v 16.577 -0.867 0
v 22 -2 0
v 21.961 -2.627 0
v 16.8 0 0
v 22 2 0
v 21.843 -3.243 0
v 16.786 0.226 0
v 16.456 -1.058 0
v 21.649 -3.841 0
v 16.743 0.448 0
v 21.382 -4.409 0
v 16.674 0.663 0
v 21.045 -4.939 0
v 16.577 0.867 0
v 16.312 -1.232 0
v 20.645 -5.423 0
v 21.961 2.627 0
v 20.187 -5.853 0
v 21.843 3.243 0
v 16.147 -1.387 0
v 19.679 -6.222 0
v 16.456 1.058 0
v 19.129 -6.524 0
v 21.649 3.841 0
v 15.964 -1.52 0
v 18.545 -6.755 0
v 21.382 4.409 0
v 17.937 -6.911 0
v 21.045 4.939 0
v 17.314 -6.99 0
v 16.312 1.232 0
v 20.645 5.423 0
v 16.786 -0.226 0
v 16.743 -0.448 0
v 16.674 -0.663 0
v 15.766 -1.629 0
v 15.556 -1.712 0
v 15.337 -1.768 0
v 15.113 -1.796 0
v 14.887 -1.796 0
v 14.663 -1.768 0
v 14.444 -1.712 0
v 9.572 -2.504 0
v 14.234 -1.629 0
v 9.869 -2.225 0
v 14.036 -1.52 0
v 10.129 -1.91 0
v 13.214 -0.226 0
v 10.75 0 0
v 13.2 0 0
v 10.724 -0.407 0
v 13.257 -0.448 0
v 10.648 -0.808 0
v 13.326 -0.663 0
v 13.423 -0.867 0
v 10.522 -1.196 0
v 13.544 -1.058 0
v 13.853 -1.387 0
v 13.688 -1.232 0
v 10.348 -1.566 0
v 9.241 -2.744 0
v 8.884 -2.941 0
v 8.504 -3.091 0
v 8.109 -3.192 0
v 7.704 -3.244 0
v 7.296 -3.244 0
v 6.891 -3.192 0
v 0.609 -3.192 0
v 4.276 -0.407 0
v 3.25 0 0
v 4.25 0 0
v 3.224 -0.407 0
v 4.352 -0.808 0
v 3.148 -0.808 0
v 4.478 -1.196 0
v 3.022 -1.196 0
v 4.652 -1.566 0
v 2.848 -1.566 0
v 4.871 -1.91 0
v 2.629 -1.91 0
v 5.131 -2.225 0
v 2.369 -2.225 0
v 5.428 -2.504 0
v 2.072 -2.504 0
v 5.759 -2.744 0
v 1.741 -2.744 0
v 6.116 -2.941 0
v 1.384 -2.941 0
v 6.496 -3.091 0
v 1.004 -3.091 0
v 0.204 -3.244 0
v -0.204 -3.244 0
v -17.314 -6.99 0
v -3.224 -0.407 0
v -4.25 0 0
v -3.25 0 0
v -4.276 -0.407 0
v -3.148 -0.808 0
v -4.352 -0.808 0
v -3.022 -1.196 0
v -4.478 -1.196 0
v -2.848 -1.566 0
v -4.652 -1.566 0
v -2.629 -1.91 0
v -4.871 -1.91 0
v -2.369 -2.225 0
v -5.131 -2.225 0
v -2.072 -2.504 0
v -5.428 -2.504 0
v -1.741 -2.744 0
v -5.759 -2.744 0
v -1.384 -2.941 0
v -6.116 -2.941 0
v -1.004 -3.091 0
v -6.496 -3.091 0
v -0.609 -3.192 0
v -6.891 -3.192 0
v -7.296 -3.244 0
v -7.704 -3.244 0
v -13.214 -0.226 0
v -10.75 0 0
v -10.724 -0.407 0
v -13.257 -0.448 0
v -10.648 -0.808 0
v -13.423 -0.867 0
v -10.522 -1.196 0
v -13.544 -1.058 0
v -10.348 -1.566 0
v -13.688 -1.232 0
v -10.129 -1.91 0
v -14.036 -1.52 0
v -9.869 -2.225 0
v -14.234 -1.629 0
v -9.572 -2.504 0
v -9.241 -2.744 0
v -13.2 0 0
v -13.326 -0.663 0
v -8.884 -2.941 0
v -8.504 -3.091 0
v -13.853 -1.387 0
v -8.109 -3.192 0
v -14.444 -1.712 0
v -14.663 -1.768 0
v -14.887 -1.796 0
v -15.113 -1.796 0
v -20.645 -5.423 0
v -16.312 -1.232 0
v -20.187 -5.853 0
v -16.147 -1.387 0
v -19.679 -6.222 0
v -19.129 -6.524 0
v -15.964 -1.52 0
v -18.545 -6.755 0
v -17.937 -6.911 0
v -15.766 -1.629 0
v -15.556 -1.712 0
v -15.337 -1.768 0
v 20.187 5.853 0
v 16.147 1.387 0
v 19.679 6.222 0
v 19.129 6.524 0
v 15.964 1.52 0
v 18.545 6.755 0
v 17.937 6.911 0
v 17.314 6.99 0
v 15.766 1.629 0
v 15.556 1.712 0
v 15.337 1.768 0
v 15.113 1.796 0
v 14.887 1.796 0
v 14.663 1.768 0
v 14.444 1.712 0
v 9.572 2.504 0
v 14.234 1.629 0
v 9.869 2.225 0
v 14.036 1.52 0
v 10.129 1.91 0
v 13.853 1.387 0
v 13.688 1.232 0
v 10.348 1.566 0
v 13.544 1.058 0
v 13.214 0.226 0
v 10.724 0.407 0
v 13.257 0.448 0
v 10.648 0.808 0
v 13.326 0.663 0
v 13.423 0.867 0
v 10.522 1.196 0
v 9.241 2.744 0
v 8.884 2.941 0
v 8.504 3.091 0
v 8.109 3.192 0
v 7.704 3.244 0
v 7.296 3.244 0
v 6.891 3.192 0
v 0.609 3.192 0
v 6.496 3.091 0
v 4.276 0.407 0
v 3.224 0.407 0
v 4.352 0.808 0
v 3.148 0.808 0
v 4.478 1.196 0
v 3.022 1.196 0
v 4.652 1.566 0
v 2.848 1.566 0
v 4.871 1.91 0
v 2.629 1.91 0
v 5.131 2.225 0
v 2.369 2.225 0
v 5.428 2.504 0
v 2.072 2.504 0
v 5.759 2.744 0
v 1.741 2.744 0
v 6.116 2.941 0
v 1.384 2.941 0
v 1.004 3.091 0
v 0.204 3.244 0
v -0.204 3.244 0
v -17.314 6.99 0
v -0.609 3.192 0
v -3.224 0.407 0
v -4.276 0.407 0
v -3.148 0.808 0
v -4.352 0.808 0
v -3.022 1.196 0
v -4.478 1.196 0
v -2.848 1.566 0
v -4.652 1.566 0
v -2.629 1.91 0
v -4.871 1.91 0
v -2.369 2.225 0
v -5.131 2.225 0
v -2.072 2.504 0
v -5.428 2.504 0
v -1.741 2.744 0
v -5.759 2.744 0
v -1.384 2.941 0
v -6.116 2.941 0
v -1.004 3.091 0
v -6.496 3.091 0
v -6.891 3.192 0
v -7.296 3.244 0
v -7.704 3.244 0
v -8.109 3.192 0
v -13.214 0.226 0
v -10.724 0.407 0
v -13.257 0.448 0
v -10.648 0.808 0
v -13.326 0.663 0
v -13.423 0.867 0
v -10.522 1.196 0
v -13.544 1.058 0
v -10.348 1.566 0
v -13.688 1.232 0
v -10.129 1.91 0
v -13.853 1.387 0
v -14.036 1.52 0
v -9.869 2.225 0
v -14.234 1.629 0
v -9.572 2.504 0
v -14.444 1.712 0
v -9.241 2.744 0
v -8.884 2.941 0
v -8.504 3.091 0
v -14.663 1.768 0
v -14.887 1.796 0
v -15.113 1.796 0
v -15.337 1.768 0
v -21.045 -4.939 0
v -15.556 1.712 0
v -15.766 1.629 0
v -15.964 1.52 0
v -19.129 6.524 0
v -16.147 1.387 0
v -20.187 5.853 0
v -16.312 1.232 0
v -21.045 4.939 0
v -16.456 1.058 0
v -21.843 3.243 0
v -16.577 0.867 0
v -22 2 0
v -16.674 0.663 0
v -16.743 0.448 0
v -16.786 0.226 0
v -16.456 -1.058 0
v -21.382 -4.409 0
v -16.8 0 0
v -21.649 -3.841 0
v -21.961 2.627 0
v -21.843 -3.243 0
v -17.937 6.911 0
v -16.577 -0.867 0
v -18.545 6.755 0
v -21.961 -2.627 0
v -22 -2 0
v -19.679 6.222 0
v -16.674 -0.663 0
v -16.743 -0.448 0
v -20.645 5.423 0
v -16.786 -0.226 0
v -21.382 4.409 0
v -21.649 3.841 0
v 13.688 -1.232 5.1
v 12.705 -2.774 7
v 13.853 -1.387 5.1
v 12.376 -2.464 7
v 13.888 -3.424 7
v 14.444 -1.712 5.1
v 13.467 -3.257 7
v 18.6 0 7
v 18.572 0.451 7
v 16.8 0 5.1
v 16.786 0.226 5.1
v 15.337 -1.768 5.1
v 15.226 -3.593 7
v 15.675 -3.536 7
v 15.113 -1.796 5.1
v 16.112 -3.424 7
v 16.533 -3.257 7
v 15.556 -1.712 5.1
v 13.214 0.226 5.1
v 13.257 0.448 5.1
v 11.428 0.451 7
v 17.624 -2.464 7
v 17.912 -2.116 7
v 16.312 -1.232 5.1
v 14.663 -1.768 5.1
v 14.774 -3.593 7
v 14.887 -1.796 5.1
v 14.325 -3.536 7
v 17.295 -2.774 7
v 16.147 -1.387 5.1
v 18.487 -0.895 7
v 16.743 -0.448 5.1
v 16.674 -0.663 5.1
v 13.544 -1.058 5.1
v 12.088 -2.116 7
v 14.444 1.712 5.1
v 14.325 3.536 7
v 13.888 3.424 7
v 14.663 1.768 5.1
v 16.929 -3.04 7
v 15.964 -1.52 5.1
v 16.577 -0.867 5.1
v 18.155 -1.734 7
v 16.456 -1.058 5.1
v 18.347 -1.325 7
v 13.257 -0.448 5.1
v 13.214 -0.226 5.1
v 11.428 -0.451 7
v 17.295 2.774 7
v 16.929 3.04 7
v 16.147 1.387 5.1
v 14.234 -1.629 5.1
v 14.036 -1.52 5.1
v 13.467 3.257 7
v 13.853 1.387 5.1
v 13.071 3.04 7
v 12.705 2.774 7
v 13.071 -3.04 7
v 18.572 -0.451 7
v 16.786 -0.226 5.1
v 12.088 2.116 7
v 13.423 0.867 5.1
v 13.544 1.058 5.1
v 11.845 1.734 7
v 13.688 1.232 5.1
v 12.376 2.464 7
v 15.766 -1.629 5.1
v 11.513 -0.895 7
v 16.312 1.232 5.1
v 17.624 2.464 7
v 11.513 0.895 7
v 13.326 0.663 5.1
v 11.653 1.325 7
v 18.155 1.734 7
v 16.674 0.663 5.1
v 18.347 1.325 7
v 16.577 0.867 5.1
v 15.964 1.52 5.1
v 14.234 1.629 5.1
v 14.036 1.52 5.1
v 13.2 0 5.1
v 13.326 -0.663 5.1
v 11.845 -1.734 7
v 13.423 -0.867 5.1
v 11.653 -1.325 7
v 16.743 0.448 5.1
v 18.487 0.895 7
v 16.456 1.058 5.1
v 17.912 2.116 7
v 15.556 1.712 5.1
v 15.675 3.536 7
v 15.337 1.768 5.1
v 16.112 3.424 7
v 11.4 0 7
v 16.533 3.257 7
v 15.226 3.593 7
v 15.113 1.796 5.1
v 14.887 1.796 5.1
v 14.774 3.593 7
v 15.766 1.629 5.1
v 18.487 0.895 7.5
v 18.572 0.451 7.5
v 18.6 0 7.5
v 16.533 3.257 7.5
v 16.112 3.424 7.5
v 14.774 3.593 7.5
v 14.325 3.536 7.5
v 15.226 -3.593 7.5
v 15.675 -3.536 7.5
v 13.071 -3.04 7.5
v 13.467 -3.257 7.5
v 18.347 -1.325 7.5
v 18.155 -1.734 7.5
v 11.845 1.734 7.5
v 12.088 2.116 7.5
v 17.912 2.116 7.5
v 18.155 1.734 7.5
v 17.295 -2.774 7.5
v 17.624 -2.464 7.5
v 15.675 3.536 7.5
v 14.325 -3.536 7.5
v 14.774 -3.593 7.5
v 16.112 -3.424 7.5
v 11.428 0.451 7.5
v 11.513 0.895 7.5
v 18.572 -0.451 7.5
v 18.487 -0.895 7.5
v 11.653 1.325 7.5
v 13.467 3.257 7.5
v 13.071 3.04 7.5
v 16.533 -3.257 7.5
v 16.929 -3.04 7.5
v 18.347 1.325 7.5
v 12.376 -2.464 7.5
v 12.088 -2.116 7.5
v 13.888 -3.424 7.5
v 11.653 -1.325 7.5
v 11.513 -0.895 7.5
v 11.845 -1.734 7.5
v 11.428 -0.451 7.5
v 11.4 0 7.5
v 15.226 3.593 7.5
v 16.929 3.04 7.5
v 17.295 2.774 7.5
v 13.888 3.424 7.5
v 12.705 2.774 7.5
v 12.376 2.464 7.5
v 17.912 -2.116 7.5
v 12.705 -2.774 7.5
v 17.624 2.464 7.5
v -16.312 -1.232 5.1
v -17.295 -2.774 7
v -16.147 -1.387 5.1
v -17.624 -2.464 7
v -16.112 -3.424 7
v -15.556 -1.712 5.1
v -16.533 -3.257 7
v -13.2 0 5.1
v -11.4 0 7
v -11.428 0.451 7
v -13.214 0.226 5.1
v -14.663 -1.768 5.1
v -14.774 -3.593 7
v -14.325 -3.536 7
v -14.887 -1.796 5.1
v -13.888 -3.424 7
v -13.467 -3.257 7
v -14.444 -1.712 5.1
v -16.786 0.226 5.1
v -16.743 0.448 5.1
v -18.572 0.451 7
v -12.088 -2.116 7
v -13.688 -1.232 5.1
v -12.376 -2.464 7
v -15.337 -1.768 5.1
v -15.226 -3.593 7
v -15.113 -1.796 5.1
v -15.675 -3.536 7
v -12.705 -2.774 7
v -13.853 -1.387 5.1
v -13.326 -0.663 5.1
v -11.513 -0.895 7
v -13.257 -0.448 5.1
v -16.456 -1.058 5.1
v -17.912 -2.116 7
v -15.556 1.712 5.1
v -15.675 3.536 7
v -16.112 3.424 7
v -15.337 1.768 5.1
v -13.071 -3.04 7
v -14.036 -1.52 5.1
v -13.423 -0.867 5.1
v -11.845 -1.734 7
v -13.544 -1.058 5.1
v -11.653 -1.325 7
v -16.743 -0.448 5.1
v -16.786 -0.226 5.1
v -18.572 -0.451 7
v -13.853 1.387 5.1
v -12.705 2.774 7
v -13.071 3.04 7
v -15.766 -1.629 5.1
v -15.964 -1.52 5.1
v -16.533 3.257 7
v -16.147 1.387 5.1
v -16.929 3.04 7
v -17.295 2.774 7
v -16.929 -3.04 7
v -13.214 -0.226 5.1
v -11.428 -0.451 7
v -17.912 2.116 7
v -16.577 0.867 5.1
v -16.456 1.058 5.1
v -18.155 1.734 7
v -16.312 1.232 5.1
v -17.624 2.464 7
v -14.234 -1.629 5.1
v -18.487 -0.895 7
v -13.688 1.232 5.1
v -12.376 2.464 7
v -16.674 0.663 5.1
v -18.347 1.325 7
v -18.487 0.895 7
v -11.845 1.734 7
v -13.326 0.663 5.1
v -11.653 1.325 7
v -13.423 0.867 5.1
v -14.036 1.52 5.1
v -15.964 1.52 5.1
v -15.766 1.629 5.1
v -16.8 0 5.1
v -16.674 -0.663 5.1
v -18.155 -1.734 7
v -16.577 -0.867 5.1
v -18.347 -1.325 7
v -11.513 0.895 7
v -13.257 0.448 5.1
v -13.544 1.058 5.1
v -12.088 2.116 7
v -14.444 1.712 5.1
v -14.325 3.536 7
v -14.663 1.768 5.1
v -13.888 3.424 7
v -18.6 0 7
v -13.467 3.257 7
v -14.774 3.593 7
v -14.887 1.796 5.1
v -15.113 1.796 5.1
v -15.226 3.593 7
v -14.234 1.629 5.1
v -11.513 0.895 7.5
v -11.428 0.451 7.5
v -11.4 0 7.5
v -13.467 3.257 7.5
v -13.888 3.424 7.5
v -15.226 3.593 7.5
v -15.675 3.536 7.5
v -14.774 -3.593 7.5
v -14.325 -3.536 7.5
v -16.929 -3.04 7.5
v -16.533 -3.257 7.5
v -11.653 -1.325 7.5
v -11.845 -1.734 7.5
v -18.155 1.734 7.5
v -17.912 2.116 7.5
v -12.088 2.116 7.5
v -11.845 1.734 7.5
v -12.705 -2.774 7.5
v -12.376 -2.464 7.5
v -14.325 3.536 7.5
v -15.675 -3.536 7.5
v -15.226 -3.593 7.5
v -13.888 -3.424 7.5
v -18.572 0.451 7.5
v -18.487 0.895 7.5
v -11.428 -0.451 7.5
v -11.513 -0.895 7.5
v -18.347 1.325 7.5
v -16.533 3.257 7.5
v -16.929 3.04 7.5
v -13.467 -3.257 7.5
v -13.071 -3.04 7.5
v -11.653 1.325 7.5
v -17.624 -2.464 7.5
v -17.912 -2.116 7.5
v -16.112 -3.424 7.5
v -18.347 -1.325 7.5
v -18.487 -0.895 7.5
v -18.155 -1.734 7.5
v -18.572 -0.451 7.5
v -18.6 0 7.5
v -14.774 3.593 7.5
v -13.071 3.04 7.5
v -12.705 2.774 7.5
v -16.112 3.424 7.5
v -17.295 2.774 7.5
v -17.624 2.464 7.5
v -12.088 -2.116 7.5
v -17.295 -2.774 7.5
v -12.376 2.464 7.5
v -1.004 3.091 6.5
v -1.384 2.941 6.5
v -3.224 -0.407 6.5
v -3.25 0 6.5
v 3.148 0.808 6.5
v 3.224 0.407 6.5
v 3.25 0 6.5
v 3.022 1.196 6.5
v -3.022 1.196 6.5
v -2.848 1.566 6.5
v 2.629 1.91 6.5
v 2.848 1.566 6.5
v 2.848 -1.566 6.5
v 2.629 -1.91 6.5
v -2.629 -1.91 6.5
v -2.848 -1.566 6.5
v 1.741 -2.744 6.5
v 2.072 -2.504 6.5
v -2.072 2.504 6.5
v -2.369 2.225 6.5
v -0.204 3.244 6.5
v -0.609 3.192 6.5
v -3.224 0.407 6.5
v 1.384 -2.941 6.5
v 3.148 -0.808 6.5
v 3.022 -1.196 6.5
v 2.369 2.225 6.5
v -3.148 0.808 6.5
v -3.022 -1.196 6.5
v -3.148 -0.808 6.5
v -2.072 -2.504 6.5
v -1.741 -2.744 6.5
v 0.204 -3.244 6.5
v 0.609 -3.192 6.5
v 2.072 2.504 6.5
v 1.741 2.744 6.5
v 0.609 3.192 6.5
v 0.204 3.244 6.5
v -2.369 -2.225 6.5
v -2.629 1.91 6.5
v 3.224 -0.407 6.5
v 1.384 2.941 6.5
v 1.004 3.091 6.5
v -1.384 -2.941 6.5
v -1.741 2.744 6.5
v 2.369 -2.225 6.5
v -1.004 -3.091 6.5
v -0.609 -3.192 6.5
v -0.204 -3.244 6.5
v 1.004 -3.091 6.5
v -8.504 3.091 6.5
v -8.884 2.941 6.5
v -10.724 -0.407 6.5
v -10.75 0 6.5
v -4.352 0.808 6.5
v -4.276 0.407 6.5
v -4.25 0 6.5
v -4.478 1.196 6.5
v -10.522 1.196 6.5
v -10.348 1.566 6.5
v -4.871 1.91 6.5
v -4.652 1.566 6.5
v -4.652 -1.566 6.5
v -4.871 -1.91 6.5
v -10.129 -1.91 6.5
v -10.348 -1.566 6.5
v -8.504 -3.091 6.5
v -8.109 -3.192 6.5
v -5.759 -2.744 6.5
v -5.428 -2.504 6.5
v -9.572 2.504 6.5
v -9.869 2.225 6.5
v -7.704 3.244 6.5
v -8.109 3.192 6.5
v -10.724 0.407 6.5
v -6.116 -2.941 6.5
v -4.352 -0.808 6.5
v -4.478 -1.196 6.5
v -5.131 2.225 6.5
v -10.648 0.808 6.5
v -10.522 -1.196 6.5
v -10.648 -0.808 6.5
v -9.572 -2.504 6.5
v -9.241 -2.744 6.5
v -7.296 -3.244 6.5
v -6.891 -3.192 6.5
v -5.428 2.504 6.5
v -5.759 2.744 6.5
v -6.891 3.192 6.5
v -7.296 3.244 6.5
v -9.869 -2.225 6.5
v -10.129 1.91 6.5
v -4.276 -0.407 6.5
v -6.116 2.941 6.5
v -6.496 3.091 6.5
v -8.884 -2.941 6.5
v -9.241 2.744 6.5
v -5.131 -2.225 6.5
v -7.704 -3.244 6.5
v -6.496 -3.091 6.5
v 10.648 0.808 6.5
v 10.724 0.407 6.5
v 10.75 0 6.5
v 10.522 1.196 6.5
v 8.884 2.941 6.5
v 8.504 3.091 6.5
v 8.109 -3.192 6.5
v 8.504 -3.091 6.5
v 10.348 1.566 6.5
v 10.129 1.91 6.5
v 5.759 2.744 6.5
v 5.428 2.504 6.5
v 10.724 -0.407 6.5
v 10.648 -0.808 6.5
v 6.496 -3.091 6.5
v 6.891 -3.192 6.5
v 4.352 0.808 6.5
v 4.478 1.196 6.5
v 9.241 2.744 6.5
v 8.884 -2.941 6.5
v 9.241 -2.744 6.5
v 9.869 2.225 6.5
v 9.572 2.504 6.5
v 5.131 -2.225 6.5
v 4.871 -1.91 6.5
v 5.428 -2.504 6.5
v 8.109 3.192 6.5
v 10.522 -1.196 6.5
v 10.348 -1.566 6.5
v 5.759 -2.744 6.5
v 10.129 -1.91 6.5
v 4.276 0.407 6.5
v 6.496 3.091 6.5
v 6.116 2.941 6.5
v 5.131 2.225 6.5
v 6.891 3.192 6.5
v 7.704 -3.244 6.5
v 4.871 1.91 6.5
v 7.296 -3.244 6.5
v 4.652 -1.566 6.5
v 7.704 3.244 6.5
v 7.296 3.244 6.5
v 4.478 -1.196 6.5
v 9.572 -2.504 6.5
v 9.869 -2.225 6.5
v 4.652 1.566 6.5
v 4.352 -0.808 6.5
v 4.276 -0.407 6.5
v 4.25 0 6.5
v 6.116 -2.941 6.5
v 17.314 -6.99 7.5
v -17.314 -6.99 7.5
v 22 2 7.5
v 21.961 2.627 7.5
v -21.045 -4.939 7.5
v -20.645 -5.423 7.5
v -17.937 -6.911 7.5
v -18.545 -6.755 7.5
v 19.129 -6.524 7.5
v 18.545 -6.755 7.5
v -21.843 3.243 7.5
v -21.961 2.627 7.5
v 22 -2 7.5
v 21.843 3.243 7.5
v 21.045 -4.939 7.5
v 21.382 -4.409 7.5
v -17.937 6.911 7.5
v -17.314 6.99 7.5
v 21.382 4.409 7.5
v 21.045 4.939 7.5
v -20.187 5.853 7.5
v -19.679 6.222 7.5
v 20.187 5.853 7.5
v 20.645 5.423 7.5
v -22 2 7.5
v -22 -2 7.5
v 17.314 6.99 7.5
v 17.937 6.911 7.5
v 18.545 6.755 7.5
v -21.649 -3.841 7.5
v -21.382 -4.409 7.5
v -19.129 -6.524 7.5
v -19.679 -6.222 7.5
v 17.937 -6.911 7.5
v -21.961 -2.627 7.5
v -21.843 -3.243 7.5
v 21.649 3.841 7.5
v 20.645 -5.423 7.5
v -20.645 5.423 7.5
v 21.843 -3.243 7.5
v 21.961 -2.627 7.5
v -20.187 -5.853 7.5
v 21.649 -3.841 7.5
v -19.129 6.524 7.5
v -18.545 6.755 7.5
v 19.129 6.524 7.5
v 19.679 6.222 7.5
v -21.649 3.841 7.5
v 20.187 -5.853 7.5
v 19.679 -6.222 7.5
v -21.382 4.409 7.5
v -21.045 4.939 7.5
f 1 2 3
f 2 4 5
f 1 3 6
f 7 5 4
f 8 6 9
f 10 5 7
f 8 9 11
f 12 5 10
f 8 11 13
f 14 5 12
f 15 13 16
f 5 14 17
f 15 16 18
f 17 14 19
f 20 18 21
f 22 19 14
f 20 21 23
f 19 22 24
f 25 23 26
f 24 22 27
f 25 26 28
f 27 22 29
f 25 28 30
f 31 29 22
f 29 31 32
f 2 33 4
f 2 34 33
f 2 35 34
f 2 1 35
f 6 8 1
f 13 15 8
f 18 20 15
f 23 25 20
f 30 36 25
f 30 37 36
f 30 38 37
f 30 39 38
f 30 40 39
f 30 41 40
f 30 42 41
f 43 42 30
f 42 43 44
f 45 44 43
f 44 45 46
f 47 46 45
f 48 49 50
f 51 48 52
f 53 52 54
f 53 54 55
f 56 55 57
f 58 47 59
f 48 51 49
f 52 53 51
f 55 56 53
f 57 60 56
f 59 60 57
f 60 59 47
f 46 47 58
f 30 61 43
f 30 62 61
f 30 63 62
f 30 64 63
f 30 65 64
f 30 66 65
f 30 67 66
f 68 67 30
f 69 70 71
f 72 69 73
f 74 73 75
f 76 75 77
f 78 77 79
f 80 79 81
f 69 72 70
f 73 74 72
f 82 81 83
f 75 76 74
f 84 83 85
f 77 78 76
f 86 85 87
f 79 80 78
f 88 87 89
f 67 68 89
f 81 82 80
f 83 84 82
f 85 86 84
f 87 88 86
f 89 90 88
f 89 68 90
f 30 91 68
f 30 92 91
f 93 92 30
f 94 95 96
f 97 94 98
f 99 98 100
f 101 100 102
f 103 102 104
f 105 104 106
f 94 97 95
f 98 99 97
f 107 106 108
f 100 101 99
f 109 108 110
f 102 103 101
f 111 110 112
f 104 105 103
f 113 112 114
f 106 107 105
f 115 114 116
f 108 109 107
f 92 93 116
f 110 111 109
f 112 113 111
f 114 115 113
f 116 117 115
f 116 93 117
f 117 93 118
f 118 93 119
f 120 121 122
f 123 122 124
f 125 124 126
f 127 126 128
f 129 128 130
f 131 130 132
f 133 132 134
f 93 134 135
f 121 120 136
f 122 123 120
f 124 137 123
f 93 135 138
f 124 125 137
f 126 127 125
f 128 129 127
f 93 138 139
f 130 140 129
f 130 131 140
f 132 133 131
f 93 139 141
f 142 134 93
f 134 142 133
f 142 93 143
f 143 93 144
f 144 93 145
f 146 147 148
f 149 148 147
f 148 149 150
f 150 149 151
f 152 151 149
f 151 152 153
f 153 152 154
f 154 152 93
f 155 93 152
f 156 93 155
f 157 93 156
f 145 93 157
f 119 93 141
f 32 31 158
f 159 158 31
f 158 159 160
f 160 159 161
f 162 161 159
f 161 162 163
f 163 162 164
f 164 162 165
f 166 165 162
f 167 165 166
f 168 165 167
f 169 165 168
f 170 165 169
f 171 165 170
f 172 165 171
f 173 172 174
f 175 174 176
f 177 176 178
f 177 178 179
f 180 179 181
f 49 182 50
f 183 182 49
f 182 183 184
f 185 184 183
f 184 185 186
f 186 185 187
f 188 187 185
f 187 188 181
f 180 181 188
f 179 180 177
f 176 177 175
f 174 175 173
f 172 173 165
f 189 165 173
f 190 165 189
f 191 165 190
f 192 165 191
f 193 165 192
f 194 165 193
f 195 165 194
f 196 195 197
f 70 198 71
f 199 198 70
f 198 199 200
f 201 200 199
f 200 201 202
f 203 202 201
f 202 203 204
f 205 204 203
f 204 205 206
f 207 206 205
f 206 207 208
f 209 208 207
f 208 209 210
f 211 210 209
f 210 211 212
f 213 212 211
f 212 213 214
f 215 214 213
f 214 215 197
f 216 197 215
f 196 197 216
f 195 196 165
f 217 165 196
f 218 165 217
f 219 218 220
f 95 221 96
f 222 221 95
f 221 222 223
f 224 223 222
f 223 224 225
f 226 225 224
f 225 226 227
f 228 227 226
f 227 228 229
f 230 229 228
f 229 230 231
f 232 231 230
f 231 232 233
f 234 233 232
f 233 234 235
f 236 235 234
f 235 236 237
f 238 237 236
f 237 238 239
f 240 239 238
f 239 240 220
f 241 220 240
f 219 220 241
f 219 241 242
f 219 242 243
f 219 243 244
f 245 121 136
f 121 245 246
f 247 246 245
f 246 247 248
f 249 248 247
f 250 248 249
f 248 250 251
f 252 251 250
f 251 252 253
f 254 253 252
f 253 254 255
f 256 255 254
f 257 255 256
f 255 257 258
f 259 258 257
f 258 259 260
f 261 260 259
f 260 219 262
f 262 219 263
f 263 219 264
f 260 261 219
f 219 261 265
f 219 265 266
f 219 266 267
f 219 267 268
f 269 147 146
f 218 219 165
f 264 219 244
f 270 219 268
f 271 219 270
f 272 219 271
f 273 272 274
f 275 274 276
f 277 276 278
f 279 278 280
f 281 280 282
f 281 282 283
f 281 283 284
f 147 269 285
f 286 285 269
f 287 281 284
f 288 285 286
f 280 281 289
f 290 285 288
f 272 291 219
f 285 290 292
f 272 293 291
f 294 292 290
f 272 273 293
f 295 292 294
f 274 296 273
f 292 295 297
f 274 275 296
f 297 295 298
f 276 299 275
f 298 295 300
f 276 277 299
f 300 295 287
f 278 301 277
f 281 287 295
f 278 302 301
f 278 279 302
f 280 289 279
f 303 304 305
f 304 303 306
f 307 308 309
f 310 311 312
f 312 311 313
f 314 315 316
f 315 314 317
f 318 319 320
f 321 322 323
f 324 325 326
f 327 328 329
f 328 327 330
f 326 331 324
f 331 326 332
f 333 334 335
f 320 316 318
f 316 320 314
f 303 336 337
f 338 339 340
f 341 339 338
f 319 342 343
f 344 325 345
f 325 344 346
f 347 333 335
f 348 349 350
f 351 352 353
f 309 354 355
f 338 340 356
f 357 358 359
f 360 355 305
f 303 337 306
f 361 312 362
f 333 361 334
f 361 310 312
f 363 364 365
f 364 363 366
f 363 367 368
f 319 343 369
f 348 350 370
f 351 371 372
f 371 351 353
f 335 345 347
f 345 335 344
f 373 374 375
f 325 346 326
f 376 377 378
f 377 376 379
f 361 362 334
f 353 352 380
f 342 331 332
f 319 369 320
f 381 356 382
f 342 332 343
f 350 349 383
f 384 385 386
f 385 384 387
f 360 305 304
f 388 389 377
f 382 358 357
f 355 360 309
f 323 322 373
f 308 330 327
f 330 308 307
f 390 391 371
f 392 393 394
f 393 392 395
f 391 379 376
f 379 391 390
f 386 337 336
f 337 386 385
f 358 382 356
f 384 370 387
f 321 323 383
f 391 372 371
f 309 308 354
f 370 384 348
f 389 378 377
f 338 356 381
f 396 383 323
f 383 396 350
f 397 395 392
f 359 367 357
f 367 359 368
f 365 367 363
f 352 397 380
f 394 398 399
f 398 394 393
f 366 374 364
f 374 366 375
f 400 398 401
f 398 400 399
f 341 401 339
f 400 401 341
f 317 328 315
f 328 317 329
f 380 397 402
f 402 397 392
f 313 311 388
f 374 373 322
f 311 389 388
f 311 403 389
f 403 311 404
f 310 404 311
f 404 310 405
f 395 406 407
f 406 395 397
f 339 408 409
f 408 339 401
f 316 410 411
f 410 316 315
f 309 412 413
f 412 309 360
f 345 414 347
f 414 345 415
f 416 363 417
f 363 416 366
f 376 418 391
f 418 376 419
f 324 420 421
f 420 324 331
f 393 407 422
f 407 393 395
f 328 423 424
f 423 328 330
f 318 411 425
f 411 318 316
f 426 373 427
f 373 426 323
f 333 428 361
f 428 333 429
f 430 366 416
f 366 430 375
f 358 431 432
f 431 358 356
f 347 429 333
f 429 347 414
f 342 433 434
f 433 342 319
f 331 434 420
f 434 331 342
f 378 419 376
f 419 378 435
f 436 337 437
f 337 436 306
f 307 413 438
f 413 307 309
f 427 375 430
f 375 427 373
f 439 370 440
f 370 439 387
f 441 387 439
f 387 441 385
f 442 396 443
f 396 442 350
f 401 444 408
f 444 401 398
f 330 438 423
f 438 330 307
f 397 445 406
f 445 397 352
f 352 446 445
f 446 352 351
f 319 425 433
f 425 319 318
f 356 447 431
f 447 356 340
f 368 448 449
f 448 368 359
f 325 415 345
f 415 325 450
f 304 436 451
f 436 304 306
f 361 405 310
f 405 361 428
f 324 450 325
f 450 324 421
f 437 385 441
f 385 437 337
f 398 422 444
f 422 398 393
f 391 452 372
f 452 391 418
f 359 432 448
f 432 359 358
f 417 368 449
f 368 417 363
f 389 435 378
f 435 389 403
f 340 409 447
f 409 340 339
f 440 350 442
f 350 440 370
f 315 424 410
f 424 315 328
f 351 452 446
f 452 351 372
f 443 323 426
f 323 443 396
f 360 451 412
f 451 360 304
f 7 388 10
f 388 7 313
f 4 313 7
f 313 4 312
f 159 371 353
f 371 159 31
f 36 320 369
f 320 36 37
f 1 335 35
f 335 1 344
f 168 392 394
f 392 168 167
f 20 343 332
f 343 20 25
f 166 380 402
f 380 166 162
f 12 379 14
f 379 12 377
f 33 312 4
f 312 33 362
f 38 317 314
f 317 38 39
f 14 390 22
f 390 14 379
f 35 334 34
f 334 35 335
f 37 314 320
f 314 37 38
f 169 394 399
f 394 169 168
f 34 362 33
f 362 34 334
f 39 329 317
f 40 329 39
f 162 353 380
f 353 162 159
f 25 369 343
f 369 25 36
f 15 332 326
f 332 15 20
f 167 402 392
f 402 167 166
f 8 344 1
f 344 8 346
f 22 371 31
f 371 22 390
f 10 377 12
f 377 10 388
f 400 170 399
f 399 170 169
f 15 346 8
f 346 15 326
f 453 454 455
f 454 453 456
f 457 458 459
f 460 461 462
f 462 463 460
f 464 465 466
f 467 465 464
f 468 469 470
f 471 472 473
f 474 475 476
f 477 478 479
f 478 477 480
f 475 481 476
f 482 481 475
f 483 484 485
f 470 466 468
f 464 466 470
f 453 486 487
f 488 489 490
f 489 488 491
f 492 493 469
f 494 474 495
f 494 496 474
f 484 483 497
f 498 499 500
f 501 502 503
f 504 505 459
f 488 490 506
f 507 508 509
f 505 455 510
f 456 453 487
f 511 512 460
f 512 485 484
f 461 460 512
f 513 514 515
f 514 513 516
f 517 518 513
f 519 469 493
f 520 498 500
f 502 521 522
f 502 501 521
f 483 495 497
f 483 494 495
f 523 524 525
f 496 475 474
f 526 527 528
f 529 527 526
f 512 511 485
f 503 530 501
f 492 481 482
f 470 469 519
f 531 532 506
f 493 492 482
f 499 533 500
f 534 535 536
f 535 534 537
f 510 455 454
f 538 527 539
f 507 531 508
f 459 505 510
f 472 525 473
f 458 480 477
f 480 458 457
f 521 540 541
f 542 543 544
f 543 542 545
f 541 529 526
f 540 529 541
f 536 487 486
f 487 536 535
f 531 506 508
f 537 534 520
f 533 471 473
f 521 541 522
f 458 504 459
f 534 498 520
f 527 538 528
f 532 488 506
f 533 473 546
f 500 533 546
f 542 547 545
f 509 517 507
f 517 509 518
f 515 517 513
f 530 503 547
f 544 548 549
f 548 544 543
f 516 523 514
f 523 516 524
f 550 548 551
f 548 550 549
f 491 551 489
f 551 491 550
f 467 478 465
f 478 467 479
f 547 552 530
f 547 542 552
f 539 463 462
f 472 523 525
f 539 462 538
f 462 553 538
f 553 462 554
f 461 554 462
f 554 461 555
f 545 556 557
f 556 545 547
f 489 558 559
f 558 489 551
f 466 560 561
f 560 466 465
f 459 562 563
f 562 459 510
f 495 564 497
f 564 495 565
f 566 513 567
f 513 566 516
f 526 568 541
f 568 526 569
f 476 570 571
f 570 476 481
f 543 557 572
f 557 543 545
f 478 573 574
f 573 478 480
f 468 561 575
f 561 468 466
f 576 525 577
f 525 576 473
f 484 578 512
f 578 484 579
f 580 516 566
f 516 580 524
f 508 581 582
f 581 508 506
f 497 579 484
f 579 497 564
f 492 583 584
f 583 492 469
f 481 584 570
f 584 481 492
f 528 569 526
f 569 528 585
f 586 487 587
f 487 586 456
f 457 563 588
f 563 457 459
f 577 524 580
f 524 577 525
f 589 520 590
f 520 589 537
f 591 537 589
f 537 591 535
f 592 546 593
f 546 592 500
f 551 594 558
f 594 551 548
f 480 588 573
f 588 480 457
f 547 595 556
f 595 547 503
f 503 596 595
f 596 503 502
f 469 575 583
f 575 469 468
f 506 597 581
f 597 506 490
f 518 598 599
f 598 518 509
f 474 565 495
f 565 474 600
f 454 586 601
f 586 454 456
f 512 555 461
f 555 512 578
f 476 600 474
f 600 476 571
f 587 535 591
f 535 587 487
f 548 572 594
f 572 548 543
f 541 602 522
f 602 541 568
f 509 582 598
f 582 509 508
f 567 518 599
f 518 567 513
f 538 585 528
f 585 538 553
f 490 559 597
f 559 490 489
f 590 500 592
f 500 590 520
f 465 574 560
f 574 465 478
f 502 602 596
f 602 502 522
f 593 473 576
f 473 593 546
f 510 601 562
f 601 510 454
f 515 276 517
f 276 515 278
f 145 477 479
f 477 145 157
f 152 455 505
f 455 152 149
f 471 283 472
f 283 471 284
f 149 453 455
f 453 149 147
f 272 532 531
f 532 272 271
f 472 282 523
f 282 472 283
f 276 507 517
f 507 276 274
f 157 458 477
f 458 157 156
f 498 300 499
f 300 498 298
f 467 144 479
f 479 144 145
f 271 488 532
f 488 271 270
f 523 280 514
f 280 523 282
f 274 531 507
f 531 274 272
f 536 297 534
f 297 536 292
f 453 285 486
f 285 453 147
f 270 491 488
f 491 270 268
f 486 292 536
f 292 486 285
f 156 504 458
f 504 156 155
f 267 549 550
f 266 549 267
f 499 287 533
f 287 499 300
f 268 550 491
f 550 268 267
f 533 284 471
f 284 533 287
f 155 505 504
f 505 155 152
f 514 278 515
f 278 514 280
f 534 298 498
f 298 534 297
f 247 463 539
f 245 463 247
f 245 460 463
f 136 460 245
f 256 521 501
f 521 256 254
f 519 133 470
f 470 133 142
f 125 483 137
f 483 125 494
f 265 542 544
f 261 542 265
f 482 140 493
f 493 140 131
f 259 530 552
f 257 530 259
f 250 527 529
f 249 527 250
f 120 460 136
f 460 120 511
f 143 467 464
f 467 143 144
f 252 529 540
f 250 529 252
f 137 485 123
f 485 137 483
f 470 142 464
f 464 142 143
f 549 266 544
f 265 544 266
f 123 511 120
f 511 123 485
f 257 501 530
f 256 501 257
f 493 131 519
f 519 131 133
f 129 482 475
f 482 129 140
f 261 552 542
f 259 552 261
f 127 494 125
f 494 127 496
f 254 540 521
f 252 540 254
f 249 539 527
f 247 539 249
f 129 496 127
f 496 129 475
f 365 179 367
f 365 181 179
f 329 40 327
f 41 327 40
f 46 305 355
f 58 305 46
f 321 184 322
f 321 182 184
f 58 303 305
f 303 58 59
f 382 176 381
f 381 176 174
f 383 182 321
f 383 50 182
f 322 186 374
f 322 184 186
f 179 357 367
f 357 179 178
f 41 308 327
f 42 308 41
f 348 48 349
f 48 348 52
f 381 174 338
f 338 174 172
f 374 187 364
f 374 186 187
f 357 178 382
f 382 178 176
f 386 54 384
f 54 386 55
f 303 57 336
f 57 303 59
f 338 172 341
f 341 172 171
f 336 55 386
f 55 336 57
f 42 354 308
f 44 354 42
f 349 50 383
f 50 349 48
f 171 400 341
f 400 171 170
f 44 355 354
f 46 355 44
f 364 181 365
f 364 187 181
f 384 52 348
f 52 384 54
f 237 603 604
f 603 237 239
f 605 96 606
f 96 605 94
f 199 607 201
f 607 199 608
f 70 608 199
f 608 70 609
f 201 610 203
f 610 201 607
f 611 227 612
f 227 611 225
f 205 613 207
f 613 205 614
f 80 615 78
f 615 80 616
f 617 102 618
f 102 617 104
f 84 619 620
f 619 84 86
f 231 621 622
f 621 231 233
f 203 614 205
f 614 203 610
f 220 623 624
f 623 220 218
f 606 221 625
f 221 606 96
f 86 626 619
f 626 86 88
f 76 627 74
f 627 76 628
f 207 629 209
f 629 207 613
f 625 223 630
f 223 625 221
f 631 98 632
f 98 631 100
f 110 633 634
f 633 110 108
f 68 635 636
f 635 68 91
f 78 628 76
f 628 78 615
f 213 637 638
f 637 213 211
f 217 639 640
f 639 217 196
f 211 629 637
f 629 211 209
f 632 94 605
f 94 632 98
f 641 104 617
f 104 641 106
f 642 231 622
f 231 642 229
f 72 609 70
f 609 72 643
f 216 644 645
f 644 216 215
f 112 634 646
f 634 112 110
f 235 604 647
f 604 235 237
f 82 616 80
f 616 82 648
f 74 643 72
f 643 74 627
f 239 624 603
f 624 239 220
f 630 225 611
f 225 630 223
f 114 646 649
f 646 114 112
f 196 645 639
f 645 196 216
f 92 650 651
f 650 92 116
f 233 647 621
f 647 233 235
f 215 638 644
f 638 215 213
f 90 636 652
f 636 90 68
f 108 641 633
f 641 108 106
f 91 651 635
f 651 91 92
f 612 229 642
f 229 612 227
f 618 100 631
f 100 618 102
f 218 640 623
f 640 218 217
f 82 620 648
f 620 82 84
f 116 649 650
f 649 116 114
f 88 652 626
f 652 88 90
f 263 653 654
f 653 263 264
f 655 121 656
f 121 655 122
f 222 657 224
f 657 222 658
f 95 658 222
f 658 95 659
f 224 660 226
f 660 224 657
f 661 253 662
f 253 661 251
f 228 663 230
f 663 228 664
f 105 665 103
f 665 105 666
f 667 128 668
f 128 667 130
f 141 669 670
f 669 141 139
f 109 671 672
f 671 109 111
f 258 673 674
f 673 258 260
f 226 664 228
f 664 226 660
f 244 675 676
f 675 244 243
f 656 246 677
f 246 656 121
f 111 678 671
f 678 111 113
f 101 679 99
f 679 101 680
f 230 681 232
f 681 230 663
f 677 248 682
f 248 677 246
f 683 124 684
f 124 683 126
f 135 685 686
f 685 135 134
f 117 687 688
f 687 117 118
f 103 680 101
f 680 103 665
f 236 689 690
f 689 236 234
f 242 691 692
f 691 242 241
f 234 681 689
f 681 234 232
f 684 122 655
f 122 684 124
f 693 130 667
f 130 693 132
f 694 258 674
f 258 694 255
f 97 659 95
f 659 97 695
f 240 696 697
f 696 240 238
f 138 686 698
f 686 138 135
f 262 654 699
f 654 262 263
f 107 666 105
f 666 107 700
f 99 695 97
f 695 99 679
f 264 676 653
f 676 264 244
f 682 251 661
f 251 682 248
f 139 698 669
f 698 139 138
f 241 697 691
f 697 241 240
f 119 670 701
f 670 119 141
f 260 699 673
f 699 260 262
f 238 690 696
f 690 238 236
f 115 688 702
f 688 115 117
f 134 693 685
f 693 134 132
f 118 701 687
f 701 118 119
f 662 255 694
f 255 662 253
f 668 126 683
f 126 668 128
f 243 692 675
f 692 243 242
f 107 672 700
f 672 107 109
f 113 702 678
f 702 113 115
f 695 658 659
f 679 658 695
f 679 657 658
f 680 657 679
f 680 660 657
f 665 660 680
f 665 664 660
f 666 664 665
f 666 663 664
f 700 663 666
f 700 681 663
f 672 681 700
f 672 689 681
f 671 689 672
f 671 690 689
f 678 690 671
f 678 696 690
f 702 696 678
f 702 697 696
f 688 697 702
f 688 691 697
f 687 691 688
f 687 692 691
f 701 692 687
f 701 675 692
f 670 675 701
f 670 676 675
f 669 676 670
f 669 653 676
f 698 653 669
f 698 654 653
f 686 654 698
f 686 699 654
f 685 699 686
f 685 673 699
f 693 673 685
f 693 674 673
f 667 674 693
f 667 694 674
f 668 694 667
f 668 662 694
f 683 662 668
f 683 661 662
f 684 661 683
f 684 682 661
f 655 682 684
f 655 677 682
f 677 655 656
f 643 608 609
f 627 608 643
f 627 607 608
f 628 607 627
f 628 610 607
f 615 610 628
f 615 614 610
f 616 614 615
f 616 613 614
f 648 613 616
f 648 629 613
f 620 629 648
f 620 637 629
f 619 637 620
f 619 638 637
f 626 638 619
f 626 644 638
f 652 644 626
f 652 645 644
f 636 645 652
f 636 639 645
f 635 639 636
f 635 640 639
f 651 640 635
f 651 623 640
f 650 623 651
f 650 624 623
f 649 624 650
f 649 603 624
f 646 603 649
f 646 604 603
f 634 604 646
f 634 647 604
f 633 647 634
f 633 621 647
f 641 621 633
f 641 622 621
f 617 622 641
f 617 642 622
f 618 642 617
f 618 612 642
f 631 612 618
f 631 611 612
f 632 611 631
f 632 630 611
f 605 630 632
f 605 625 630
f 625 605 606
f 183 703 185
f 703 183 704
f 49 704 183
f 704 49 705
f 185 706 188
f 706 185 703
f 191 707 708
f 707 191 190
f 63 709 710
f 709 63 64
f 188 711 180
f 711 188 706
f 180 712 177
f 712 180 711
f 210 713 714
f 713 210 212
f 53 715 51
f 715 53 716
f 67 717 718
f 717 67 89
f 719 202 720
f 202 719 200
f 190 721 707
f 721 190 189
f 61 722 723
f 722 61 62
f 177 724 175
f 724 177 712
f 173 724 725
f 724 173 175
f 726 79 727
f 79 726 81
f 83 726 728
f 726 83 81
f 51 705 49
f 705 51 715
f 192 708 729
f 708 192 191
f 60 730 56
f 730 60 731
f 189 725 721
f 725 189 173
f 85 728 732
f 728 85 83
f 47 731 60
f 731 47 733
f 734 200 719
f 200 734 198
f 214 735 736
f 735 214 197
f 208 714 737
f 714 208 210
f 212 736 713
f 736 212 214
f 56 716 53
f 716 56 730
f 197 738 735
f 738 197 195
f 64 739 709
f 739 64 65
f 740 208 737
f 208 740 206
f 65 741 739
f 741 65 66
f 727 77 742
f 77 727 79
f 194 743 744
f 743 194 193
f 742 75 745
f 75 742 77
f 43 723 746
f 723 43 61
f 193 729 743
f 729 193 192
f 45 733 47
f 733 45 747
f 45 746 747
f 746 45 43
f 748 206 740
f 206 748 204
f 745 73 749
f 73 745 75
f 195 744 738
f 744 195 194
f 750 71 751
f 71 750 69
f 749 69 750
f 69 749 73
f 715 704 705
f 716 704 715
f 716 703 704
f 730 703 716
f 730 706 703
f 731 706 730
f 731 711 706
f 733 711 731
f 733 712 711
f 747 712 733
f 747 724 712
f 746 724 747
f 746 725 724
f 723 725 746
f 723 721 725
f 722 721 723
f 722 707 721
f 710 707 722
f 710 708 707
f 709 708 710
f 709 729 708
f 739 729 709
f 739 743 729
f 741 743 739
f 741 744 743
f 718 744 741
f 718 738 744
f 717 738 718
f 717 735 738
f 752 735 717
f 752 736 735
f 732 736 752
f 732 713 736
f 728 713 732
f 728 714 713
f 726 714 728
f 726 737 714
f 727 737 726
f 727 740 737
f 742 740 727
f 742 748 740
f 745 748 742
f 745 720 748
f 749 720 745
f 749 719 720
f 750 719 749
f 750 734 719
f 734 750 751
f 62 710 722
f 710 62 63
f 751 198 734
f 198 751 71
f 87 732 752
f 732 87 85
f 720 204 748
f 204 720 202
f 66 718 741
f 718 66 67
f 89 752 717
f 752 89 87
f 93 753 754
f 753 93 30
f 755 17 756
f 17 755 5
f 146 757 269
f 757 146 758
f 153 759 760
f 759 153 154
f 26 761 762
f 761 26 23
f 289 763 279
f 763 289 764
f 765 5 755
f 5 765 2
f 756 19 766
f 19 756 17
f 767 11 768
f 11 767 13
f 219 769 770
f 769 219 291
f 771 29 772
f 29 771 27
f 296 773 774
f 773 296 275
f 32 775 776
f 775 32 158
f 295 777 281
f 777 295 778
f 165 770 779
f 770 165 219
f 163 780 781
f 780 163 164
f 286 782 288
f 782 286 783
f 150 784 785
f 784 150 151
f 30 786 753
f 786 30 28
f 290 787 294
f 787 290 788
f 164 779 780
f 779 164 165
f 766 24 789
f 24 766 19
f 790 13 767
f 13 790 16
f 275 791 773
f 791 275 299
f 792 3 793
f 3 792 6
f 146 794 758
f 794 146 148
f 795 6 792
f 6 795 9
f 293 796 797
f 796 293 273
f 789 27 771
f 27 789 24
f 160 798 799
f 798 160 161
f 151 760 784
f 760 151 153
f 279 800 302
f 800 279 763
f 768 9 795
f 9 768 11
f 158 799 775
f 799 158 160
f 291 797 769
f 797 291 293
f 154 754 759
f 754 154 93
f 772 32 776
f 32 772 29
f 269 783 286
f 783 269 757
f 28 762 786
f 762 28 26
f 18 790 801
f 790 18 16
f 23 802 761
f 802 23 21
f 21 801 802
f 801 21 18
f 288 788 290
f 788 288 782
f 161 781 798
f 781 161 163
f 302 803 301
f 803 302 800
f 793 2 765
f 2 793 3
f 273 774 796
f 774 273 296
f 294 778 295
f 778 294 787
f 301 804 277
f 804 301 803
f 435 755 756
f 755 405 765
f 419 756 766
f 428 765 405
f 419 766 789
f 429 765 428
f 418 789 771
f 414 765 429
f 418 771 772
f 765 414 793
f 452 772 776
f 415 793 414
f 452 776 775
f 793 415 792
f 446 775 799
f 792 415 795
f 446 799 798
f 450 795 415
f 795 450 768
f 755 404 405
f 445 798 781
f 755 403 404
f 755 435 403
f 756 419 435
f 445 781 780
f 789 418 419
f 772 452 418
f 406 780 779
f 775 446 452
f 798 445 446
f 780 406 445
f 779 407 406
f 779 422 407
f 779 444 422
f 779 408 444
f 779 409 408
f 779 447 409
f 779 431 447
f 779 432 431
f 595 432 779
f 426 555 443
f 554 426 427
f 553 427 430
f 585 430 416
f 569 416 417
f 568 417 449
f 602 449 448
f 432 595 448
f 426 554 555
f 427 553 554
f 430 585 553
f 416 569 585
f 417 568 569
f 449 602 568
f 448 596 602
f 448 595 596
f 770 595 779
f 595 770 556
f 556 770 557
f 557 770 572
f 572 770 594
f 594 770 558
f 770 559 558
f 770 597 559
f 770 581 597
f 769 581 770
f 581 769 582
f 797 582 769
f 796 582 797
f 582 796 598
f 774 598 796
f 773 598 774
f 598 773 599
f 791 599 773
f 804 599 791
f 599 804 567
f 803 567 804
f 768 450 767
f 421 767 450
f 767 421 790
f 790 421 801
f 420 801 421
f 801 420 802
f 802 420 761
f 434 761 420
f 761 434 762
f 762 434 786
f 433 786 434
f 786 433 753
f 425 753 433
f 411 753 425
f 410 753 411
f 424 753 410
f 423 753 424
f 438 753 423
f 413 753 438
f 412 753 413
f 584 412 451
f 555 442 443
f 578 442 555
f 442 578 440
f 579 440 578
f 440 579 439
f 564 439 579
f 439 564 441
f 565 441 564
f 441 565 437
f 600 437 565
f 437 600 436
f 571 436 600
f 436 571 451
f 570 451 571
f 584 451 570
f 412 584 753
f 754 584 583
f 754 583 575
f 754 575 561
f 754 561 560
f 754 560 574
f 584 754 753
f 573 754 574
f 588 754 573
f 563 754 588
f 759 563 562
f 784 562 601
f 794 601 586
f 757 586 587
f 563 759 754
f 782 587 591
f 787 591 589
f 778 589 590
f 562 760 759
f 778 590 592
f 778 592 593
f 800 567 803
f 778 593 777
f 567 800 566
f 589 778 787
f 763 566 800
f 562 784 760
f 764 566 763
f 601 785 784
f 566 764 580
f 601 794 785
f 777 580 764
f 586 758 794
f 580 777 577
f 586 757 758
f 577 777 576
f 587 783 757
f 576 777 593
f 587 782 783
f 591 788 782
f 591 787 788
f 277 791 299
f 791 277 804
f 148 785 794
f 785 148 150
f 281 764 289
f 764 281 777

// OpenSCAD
$fn = 50;


difference() {
	union() {
		hull() {
			translate(v = [-17.0000000000, 2.0000000000, 0]) {
				cylinder(h = 7.5000000000, r = 5);
			}
			translate(v = [17.0000000000, 2.0000000000, 0]) {
				cylinder(h = 7.5000000000, r = 5);
			}
			translate(v = [-17.0000000000, -2.0000000000, 0]) {
				cylinder(h = 7.5000000000, r = 5);
			}
			translate(v = [17.0000000000, -2.0000000000, 0]) {
				cylinder(h = 7.5000000000, r = 5);
			}
		}
	}
	union() {
		translate(v = [15.0000000000, 0, 7.0000000000]) {
			rotate(a = [0, 0, 0]) {
				difference() {
					union() {
						translate(v = [0, 0, -7.0000000000]) {
							cylinder(h = 7.0000000000, r = 1.5000000000);
						}
						translate(v = [0, 0, -1.9000000000]) {
							cylinder(h = 1.9000000000, r1 = 1.8000000000, r2 = 3.6000000000);
						}
						cylinder(h = 250, r = 3.6000000000);
						translate(v = [0, 0, -7.0000000000]) {
							cylinder(h = 7.0000000000, r = 1.8000000000);
						}
						translate(v = [0, 0, -7.0000000000]) {
							cylinder(h = 7.0000000000, r = 1.5000000000);
						}
					}
					union();
				}
			}
		}
		translate(v = [-15.0000000000, 0, 7.0000000000]) {
			rotate(a = [0, 0, 0]) {
				difference() {
					union() {
						translate(v = [0, 0, -7.0000000000]) {
							cylinder(h = 7.0000000000, r = 1.5000000000);
						}
						translate(v = [0, 0, -1.9000000000]) {
							cylinder(h = 1.9000000000, r1 = 1.8000000000, r2 = 3.6000000000);
						}
						cylinder(h = 250, r = 3.6000000000);
						translate(v = [0, 0, -7.0000000000]) {
							cylinder(h = 7.0000000000, r = 1.8000000000);
						}
						translate(v = [0, 0, -7.0000000000]) {
							cylinder(h = 7.0000000000, r = 1.5000000000);
						}
					}
					union();
				}
			}
		}
		translate(v = [-15.0000000000, 0.0000000000, 0]) {
			cylinder(h = 7.5000000000, r = 1.8000000000);
		}
		translate(v = [15.0000000000, 0.0000000000, 0]) {
			cylinder(h = 7.5000000000, r = 1.8000000000);
		}
		translate(v = [-15.0000000000, 0.0000000000, 0]) {
			cylinder(h = 7.5000000000, r = 1.8000000000);
		}
		translate(v = [15.0000000000, 0.0000000000, 0]) {
			cylinder(h = 7.5000000000, r = 1.8000000000);
		}
		translate(v = [-15.0000000000, 0.0000000000, 0]) {
			cylinder(h = 7.5000000000, r = 1.8000000000);
		}
		translate(v = [15.0000000000, 0.0000000000, 0]) {
			cylinder(h = 7.5000000000, r = 1.8000000000);
		}
		translate(v = [-15.0000000000, 0.0000000000, 0]) {
			cylinder(h = 7.5000000000, r = 1.8000000000);
		}
		translate(v = [15.0000000000, 0.0000000000, 0]) {
			cylinder(h = 7.5000000000, r = 1.8000000000);
		}
		translate(v = [0, 0, -3.2500000000]) {
			cylinder(h = 6.5000000000, r = 3.2500000000);
		}
		translate(v = [-7.5000000000, 0, 0.0000000000]) {
			cylinder(h = 6.5000000000, r = 3.2500000000);
		}
		cylinder(h = 6.5000000000, r = 3.2500000000);
		translate(v = [7.5000000000, 0, 0.0000000000]) {
			cylinder(h = 6.5000000000, r = 3.2500000000);
		}
	}
}
